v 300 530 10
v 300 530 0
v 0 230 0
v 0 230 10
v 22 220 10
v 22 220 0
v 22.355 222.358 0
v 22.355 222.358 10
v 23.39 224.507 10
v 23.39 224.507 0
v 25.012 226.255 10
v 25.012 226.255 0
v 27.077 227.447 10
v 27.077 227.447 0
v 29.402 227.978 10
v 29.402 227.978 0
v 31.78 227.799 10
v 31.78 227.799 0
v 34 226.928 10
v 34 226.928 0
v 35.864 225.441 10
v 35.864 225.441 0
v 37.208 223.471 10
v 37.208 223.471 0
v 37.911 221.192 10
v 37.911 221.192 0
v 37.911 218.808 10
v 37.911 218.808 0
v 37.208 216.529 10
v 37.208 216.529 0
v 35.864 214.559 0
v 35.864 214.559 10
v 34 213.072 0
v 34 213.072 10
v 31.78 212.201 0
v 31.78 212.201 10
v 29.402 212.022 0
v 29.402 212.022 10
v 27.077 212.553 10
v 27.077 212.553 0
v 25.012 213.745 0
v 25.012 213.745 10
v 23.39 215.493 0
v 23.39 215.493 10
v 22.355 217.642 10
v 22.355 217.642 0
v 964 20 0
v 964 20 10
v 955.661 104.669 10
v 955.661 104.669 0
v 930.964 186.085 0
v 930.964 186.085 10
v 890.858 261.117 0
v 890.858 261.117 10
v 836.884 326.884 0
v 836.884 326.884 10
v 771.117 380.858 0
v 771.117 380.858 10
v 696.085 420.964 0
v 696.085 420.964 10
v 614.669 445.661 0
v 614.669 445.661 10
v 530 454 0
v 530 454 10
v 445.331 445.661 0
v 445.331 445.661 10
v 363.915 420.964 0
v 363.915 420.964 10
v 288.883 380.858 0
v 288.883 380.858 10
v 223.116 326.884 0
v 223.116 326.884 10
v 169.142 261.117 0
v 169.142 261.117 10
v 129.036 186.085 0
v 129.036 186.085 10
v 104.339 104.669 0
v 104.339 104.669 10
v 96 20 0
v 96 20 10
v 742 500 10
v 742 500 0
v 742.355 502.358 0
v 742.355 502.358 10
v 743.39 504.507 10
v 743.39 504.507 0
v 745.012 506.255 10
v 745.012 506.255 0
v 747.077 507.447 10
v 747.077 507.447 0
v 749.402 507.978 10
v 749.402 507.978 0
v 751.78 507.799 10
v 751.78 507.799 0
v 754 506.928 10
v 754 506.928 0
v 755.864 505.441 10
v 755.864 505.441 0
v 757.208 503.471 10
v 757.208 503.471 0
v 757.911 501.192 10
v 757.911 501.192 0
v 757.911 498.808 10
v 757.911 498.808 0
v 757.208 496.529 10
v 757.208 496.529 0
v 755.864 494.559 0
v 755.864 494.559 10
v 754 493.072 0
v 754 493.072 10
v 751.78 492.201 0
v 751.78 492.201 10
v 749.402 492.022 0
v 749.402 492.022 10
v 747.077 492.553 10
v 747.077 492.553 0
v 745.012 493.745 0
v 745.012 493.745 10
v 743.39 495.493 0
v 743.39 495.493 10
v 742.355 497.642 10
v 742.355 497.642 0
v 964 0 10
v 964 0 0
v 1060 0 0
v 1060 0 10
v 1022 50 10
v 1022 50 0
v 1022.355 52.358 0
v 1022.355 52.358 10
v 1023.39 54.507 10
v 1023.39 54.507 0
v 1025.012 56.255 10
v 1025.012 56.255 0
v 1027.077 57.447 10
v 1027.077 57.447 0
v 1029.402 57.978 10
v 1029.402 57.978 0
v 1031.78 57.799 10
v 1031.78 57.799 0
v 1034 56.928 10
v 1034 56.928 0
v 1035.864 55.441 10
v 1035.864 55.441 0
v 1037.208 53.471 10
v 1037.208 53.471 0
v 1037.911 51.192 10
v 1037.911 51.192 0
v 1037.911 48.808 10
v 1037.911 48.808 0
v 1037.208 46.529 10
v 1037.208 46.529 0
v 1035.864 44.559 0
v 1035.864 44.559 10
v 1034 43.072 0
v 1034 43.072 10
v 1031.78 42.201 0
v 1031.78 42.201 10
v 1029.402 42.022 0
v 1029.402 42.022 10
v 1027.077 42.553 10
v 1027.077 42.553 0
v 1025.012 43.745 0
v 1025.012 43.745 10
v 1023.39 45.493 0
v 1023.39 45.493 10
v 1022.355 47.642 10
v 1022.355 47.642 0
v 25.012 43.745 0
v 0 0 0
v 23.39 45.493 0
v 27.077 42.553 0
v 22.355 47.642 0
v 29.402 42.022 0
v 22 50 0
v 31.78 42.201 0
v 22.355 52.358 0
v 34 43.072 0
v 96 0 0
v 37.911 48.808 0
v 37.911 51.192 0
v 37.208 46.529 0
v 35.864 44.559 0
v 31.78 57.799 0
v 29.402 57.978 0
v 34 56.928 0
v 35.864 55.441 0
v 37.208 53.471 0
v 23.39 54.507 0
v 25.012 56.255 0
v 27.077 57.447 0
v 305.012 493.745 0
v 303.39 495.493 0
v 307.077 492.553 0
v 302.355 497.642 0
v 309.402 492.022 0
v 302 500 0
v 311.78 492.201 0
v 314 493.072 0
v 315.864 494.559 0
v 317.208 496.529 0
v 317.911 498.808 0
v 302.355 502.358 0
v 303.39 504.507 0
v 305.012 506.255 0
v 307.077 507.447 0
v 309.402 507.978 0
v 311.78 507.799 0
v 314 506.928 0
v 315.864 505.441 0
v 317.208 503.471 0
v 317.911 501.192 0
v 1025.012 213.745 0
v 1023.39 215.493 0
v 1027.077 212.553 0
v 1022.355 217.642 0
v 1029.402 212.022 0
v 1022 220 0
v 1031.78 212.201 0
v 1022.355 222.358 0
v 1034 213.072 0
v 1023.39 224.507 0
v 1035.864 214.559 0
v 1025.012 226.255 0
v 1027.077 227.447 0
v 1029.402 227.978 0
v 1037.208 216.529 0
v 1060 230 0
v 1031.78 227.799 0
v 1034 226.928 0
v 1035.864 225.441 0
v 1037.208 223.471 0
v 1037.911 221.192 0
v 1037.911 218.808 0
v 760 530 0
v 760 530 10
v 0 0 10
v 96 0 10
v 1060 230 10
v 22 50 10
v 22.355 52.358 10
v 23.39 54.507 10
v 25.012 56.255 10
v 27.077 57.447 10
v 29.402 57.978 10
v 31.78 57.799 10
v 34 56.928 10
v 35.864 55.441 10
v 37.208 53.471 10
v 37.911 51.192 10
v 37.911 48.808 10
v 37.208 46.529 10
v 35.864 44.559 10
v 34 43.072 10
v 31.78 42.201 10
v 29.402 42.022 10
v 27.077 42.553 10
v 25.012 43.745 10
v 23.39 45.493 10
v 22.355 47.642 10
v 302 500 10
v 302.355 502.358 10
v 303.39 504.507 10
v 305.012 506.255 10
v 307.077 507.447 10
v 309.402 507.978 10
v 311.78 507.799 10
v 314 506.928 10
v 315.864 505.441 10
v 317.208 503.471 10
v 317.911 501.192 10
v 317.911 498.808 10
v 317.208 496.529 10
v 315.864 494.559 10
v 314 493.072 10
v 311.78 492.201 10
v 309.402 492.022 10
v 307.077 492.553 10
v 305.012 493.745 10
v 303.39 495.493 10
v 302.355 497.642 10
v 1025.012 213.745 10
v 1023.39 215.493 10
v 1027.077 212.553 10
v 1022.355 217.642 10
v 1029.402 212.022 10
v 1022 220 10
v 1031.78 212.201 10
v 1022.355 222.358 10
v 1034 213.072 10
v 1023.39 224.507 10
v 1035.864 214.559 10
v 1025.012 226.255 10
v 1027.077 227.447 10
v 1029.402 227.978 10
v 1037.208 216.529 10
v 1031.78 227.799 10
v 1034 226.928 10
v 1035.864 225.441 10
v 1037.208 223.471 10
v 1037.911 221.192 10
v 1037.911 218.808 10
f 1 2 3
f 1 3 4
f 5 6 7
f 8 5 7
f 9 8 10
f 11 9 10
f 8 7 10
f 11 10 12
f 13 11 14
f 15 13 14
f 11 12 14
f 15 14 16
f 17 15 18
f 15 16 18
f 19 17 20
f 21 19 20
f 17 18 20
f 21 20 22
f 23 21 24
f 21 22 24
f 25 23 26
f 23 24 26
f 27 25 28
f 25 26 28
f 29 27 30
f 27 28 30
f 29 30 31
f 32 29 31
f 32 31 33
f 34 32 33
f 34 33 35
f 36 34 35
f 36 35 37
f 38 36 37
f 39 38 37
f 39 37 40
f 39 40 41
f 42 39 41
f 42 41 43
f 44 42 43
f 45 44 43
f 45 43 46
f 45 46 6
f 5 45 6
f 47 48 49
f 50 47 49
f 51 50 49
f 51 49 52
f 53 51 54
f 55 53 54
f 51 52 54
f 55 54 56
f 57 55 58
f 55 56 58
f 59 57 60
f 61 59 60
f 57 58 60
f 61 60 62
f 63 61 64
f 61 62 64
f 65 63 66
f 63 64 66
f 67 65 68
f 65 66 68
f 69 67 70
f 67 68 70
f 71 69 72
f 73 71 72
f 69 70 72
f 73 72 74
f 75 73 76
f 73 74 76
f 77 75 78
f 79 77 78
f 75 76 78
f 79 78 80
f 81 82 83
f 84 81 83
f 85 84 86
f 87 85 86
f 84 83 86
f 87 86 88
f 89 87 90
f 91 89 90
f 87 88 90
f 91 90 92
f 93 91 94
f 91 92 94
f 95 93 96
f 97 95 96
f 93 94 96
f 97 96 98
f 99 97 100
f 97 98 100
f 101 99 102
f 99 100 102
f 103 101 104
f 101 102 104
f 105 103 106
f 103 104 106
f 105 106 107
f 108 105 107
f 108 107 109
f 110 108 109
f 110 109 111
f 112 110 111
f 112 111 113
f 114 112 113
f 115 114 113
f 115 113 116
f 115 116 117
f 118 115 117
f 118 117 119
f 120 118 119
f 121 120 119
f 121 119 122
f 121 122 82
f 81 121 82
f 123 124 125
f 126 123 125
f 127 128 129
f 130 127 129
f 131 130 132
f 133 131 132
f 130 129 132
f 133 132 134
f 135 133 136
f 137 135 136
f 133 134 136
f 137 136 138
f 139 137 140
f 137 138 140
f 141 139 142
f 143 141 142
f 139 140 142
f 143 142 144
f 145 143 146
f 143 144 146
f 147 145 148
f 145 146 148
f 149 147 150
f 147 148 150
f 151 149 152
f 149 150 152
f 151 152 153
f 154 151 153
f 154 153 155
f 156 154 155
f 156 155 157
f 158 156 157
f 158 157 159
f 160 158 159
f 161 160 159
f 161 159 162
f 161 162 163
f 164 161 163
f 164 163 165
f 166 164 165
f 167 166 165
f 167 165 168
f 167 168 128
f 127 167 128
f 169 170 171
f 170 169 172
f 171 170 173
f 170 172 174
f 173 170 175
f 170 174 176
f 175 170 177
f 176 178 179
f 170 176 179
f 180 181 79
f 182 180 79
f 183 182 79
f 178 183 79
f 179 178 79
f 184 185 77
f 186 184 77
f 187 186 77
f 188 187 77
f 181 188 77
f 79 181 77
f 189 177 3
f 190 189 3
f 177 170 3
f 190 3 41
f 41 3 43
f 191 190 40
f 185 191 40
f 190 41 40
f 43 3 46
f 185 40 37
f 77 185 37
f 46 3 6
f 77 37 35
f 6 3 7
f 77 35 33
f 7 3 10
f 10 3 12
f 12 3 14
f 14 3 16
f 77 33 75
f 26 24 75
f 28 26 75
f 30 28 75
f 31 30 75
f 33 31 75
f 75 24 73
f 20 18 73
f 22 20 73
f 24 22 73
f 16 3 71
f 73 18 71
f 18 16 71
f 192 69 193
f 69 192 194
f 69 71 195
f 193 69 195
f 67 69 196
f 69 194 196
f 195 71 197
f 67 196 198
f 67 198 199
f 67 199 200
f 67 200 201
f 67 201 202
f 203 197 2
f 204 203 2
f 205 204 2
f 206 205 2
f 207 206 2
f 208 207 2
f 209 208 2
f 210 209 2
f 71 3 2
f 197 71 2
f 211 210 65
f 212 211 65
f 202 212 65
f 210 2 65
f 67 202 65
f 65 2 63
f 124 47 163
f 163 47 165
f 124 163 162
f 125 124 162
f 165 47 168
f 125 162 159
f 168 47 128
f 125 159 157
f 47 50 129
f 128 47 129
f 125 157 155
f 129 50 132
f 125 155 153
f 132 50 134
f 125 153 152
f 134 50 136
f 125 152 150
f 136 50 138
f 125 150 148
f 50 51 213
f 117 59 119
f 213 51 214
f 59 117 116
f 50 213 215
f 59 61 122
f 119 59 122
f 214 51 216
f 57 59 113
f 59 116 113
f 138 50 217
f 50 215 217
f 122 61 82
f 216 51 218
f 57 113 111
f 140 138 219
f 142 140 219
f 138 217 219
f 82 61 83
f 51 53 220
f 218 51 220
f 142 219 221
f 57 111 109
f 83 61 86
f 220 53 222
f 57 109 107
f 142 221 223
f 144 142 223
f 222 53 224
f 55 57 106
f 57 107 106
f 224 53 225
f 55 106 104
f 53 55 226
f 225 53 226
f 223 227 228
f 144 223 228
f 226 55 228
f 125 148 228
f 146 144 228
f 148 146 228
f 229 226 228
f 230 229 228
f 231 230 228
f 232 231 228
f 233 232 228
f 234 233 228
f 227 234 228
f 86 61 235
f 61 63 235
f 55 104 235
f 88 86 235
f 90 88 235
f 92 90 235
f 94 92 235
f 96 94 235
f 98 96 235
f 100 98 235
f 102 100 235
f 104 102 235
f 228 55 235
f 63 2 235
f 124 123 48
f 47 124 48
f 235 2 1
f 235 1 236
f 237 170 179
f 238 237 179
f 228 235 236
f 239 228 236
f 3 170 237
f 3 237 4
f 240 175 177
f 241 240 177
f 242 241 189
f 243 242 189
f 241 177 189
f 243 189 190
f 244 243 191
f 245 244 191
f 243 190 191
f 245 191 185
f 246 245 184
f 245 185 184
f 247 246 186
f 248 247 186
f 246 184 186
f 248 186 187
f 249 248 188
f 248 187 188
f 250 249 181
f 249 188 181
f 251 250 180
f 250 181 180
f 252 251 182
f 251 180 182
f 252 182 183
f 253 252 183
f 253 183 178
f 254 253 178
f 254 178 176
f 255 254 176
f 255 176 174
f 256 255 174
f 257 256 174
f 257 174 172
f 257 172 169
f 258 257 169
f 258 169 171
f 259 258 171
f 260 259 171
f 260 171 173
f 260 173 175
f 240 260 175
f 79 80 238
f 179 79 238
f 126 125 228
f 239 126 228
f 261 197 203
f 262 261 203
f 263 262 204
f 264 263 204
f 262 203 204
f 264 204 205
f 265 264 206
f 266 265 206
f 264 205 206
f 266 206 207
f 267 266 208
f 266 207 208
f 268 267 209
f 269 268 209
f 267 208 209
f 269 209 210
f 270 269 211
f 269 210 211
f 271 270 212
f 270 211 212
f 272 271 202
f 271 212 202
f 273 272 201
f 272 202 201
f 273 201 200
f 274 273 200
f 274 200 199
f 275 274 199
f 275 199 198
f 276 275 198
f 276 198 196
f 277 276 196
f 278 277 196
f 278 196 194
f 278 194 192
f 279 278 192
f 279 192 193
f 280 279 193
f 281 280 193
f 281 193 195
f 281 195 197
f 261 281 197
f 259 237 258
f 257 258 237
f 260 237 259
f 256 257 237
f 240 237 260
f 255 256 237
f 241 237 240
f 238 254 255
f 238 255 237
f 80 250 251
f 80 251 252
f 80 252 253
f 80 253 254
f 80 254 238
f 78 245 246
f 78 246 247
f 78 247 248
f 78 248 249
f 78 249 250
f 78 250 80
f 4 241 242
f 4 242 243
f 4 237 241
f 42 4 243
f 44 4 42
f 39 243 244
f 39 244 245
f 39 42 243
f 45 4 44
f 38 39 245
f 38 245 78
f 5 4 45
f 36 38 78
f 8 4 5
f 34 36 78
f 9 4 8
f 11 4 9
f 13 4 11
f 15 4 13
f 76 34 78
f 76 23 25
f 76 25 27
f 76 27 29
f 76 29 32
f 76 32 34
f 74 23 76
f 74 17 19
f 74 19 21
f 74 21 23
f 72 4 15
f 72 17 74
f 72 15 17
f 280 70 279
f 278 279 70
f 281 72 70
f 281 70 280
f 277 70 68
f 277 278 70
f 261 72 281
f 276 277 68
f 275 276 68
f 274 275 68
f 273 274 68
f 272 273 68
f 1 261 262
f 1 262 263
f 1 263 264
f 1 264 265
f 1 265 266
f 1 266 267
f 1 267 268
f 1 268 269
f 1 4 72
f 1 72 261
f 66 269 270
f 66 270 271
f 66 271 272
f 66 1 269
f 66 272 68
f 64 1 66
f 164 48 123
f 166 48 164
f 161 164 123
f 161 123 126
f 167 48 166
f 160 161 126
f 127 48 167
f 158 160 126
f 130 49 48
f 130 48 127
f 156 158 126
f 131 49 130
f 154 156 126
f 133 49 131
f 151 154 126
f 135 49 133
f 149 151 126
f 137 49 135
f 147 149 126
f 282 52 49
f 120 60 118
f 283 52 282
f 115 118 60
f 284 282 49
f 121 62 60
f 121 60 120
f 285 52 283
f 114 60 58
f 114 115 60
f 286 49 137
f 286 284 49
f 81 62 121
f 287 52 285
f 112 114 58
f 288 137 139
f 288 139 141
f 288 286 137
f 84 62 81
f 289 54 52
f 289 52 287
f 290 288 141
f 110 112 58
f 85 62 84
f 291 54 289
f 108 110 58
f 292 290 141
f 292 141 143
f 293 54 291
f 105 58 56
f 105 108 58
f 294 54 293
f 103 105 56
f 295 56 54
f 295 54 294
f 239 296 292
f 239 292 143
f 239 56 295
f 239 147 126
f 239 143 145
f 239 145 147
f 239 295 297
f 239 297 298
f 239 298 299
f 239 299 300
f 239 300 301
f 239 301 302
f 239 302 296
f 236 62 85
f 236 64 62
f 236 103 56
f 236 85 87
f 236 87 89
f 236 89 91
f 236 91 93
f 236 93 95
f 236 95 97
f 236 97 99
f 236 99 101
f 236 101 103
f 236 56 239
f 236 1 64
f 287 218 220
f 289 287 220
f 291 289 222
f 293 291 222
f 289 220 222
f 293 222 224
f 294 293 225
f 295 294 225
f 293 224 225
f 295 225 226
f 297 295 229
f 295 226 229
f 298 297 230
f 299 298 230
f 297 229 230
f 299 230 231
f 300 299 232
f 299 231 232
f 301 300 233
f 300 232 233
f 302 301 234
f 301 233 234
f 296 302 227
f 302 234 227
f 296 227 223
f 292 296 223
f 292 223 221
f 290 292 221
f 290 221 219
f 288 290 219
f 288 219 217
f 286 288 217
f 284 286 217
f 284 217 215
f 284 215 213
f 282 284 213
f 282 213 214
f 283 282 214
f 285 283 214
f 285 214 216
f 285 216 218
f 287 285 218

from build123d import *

# Parameters (mm, degrees)
SKETCH_1_W                  = 1060
SKETCH_1_H                  = 530
EXTRUDE_1_DEPTH             = 10
CUT_EXTRUDE_1_DEPTH         = 10
CHAMFER_1_SIZE              = 300
HOLE_WIZARD_16_0_16_1_D     = 16
HOLE_WIZARD_16_0_16_1_DEPTH = 42
HOLE_WIZARD_16_0_16_1_TIP   = 4.806884952


with BuildPart() as part:
    # 草图1 → 凸台-拉伸1 (new body)
    with BuildSketch(Plane.XY):
        with Locations((530, 265)):
            Rectangle(SKETCH_1_W, SKETCH_1_H)
    extrude(amount=EXTRUDE_1_DEPTH)

    # 草图2 → 切除-拉伸1 (cut)
    with BuildSketch(Plane.XY.offset(10)):
        with BuildLine():
            Line((96, 20), (96, 0))
            Line((96, 0), (964, 0))
            Line((964, 0), (964, 20))
            ThreePointArc((964, 20), (530, 454), (96, 20))
        make_face()
    extrude(amount=-CUT_EXTRUDE_1_DEPTH, mode=Mode.SUBTRACT)

    # 倒角1
    chamfer_1_edges = [part.edges().sort_by_distance(p)[0] for p in [
        (0, 530, 5),
        (1060, 530, 5),
    ]]
    chamfer(chamfer_1_edges, length=CHAMFER_1_SIZE)

    # Ø16.0 (16) 直径孔1
    with Locations(Plane.XY.offset(10)):
        with Locations((30, 220), (30, 50), (1030, 220), (1030, 50), (310, 500), (750, 500)):
            Hole(HOLE_WIZARD_16_0_16_1_D / 2, depth=HOLE_WIZARD_16_0_16_1_DEPTH)
            with Locations((0, 0, -(HOLE_WIZARD_16_0_16_1_DEPTH + HOLE_WIZARD_16_0_16_1_TIP / 2))):  # 118° drill point
                Cone(0, HOLE_WIZARD_16_0_16_1_D / 2, HOLE_WIZARD_16_0_16_1_TIP, mode=Mode.SUBTRACT)


solid = part.part
